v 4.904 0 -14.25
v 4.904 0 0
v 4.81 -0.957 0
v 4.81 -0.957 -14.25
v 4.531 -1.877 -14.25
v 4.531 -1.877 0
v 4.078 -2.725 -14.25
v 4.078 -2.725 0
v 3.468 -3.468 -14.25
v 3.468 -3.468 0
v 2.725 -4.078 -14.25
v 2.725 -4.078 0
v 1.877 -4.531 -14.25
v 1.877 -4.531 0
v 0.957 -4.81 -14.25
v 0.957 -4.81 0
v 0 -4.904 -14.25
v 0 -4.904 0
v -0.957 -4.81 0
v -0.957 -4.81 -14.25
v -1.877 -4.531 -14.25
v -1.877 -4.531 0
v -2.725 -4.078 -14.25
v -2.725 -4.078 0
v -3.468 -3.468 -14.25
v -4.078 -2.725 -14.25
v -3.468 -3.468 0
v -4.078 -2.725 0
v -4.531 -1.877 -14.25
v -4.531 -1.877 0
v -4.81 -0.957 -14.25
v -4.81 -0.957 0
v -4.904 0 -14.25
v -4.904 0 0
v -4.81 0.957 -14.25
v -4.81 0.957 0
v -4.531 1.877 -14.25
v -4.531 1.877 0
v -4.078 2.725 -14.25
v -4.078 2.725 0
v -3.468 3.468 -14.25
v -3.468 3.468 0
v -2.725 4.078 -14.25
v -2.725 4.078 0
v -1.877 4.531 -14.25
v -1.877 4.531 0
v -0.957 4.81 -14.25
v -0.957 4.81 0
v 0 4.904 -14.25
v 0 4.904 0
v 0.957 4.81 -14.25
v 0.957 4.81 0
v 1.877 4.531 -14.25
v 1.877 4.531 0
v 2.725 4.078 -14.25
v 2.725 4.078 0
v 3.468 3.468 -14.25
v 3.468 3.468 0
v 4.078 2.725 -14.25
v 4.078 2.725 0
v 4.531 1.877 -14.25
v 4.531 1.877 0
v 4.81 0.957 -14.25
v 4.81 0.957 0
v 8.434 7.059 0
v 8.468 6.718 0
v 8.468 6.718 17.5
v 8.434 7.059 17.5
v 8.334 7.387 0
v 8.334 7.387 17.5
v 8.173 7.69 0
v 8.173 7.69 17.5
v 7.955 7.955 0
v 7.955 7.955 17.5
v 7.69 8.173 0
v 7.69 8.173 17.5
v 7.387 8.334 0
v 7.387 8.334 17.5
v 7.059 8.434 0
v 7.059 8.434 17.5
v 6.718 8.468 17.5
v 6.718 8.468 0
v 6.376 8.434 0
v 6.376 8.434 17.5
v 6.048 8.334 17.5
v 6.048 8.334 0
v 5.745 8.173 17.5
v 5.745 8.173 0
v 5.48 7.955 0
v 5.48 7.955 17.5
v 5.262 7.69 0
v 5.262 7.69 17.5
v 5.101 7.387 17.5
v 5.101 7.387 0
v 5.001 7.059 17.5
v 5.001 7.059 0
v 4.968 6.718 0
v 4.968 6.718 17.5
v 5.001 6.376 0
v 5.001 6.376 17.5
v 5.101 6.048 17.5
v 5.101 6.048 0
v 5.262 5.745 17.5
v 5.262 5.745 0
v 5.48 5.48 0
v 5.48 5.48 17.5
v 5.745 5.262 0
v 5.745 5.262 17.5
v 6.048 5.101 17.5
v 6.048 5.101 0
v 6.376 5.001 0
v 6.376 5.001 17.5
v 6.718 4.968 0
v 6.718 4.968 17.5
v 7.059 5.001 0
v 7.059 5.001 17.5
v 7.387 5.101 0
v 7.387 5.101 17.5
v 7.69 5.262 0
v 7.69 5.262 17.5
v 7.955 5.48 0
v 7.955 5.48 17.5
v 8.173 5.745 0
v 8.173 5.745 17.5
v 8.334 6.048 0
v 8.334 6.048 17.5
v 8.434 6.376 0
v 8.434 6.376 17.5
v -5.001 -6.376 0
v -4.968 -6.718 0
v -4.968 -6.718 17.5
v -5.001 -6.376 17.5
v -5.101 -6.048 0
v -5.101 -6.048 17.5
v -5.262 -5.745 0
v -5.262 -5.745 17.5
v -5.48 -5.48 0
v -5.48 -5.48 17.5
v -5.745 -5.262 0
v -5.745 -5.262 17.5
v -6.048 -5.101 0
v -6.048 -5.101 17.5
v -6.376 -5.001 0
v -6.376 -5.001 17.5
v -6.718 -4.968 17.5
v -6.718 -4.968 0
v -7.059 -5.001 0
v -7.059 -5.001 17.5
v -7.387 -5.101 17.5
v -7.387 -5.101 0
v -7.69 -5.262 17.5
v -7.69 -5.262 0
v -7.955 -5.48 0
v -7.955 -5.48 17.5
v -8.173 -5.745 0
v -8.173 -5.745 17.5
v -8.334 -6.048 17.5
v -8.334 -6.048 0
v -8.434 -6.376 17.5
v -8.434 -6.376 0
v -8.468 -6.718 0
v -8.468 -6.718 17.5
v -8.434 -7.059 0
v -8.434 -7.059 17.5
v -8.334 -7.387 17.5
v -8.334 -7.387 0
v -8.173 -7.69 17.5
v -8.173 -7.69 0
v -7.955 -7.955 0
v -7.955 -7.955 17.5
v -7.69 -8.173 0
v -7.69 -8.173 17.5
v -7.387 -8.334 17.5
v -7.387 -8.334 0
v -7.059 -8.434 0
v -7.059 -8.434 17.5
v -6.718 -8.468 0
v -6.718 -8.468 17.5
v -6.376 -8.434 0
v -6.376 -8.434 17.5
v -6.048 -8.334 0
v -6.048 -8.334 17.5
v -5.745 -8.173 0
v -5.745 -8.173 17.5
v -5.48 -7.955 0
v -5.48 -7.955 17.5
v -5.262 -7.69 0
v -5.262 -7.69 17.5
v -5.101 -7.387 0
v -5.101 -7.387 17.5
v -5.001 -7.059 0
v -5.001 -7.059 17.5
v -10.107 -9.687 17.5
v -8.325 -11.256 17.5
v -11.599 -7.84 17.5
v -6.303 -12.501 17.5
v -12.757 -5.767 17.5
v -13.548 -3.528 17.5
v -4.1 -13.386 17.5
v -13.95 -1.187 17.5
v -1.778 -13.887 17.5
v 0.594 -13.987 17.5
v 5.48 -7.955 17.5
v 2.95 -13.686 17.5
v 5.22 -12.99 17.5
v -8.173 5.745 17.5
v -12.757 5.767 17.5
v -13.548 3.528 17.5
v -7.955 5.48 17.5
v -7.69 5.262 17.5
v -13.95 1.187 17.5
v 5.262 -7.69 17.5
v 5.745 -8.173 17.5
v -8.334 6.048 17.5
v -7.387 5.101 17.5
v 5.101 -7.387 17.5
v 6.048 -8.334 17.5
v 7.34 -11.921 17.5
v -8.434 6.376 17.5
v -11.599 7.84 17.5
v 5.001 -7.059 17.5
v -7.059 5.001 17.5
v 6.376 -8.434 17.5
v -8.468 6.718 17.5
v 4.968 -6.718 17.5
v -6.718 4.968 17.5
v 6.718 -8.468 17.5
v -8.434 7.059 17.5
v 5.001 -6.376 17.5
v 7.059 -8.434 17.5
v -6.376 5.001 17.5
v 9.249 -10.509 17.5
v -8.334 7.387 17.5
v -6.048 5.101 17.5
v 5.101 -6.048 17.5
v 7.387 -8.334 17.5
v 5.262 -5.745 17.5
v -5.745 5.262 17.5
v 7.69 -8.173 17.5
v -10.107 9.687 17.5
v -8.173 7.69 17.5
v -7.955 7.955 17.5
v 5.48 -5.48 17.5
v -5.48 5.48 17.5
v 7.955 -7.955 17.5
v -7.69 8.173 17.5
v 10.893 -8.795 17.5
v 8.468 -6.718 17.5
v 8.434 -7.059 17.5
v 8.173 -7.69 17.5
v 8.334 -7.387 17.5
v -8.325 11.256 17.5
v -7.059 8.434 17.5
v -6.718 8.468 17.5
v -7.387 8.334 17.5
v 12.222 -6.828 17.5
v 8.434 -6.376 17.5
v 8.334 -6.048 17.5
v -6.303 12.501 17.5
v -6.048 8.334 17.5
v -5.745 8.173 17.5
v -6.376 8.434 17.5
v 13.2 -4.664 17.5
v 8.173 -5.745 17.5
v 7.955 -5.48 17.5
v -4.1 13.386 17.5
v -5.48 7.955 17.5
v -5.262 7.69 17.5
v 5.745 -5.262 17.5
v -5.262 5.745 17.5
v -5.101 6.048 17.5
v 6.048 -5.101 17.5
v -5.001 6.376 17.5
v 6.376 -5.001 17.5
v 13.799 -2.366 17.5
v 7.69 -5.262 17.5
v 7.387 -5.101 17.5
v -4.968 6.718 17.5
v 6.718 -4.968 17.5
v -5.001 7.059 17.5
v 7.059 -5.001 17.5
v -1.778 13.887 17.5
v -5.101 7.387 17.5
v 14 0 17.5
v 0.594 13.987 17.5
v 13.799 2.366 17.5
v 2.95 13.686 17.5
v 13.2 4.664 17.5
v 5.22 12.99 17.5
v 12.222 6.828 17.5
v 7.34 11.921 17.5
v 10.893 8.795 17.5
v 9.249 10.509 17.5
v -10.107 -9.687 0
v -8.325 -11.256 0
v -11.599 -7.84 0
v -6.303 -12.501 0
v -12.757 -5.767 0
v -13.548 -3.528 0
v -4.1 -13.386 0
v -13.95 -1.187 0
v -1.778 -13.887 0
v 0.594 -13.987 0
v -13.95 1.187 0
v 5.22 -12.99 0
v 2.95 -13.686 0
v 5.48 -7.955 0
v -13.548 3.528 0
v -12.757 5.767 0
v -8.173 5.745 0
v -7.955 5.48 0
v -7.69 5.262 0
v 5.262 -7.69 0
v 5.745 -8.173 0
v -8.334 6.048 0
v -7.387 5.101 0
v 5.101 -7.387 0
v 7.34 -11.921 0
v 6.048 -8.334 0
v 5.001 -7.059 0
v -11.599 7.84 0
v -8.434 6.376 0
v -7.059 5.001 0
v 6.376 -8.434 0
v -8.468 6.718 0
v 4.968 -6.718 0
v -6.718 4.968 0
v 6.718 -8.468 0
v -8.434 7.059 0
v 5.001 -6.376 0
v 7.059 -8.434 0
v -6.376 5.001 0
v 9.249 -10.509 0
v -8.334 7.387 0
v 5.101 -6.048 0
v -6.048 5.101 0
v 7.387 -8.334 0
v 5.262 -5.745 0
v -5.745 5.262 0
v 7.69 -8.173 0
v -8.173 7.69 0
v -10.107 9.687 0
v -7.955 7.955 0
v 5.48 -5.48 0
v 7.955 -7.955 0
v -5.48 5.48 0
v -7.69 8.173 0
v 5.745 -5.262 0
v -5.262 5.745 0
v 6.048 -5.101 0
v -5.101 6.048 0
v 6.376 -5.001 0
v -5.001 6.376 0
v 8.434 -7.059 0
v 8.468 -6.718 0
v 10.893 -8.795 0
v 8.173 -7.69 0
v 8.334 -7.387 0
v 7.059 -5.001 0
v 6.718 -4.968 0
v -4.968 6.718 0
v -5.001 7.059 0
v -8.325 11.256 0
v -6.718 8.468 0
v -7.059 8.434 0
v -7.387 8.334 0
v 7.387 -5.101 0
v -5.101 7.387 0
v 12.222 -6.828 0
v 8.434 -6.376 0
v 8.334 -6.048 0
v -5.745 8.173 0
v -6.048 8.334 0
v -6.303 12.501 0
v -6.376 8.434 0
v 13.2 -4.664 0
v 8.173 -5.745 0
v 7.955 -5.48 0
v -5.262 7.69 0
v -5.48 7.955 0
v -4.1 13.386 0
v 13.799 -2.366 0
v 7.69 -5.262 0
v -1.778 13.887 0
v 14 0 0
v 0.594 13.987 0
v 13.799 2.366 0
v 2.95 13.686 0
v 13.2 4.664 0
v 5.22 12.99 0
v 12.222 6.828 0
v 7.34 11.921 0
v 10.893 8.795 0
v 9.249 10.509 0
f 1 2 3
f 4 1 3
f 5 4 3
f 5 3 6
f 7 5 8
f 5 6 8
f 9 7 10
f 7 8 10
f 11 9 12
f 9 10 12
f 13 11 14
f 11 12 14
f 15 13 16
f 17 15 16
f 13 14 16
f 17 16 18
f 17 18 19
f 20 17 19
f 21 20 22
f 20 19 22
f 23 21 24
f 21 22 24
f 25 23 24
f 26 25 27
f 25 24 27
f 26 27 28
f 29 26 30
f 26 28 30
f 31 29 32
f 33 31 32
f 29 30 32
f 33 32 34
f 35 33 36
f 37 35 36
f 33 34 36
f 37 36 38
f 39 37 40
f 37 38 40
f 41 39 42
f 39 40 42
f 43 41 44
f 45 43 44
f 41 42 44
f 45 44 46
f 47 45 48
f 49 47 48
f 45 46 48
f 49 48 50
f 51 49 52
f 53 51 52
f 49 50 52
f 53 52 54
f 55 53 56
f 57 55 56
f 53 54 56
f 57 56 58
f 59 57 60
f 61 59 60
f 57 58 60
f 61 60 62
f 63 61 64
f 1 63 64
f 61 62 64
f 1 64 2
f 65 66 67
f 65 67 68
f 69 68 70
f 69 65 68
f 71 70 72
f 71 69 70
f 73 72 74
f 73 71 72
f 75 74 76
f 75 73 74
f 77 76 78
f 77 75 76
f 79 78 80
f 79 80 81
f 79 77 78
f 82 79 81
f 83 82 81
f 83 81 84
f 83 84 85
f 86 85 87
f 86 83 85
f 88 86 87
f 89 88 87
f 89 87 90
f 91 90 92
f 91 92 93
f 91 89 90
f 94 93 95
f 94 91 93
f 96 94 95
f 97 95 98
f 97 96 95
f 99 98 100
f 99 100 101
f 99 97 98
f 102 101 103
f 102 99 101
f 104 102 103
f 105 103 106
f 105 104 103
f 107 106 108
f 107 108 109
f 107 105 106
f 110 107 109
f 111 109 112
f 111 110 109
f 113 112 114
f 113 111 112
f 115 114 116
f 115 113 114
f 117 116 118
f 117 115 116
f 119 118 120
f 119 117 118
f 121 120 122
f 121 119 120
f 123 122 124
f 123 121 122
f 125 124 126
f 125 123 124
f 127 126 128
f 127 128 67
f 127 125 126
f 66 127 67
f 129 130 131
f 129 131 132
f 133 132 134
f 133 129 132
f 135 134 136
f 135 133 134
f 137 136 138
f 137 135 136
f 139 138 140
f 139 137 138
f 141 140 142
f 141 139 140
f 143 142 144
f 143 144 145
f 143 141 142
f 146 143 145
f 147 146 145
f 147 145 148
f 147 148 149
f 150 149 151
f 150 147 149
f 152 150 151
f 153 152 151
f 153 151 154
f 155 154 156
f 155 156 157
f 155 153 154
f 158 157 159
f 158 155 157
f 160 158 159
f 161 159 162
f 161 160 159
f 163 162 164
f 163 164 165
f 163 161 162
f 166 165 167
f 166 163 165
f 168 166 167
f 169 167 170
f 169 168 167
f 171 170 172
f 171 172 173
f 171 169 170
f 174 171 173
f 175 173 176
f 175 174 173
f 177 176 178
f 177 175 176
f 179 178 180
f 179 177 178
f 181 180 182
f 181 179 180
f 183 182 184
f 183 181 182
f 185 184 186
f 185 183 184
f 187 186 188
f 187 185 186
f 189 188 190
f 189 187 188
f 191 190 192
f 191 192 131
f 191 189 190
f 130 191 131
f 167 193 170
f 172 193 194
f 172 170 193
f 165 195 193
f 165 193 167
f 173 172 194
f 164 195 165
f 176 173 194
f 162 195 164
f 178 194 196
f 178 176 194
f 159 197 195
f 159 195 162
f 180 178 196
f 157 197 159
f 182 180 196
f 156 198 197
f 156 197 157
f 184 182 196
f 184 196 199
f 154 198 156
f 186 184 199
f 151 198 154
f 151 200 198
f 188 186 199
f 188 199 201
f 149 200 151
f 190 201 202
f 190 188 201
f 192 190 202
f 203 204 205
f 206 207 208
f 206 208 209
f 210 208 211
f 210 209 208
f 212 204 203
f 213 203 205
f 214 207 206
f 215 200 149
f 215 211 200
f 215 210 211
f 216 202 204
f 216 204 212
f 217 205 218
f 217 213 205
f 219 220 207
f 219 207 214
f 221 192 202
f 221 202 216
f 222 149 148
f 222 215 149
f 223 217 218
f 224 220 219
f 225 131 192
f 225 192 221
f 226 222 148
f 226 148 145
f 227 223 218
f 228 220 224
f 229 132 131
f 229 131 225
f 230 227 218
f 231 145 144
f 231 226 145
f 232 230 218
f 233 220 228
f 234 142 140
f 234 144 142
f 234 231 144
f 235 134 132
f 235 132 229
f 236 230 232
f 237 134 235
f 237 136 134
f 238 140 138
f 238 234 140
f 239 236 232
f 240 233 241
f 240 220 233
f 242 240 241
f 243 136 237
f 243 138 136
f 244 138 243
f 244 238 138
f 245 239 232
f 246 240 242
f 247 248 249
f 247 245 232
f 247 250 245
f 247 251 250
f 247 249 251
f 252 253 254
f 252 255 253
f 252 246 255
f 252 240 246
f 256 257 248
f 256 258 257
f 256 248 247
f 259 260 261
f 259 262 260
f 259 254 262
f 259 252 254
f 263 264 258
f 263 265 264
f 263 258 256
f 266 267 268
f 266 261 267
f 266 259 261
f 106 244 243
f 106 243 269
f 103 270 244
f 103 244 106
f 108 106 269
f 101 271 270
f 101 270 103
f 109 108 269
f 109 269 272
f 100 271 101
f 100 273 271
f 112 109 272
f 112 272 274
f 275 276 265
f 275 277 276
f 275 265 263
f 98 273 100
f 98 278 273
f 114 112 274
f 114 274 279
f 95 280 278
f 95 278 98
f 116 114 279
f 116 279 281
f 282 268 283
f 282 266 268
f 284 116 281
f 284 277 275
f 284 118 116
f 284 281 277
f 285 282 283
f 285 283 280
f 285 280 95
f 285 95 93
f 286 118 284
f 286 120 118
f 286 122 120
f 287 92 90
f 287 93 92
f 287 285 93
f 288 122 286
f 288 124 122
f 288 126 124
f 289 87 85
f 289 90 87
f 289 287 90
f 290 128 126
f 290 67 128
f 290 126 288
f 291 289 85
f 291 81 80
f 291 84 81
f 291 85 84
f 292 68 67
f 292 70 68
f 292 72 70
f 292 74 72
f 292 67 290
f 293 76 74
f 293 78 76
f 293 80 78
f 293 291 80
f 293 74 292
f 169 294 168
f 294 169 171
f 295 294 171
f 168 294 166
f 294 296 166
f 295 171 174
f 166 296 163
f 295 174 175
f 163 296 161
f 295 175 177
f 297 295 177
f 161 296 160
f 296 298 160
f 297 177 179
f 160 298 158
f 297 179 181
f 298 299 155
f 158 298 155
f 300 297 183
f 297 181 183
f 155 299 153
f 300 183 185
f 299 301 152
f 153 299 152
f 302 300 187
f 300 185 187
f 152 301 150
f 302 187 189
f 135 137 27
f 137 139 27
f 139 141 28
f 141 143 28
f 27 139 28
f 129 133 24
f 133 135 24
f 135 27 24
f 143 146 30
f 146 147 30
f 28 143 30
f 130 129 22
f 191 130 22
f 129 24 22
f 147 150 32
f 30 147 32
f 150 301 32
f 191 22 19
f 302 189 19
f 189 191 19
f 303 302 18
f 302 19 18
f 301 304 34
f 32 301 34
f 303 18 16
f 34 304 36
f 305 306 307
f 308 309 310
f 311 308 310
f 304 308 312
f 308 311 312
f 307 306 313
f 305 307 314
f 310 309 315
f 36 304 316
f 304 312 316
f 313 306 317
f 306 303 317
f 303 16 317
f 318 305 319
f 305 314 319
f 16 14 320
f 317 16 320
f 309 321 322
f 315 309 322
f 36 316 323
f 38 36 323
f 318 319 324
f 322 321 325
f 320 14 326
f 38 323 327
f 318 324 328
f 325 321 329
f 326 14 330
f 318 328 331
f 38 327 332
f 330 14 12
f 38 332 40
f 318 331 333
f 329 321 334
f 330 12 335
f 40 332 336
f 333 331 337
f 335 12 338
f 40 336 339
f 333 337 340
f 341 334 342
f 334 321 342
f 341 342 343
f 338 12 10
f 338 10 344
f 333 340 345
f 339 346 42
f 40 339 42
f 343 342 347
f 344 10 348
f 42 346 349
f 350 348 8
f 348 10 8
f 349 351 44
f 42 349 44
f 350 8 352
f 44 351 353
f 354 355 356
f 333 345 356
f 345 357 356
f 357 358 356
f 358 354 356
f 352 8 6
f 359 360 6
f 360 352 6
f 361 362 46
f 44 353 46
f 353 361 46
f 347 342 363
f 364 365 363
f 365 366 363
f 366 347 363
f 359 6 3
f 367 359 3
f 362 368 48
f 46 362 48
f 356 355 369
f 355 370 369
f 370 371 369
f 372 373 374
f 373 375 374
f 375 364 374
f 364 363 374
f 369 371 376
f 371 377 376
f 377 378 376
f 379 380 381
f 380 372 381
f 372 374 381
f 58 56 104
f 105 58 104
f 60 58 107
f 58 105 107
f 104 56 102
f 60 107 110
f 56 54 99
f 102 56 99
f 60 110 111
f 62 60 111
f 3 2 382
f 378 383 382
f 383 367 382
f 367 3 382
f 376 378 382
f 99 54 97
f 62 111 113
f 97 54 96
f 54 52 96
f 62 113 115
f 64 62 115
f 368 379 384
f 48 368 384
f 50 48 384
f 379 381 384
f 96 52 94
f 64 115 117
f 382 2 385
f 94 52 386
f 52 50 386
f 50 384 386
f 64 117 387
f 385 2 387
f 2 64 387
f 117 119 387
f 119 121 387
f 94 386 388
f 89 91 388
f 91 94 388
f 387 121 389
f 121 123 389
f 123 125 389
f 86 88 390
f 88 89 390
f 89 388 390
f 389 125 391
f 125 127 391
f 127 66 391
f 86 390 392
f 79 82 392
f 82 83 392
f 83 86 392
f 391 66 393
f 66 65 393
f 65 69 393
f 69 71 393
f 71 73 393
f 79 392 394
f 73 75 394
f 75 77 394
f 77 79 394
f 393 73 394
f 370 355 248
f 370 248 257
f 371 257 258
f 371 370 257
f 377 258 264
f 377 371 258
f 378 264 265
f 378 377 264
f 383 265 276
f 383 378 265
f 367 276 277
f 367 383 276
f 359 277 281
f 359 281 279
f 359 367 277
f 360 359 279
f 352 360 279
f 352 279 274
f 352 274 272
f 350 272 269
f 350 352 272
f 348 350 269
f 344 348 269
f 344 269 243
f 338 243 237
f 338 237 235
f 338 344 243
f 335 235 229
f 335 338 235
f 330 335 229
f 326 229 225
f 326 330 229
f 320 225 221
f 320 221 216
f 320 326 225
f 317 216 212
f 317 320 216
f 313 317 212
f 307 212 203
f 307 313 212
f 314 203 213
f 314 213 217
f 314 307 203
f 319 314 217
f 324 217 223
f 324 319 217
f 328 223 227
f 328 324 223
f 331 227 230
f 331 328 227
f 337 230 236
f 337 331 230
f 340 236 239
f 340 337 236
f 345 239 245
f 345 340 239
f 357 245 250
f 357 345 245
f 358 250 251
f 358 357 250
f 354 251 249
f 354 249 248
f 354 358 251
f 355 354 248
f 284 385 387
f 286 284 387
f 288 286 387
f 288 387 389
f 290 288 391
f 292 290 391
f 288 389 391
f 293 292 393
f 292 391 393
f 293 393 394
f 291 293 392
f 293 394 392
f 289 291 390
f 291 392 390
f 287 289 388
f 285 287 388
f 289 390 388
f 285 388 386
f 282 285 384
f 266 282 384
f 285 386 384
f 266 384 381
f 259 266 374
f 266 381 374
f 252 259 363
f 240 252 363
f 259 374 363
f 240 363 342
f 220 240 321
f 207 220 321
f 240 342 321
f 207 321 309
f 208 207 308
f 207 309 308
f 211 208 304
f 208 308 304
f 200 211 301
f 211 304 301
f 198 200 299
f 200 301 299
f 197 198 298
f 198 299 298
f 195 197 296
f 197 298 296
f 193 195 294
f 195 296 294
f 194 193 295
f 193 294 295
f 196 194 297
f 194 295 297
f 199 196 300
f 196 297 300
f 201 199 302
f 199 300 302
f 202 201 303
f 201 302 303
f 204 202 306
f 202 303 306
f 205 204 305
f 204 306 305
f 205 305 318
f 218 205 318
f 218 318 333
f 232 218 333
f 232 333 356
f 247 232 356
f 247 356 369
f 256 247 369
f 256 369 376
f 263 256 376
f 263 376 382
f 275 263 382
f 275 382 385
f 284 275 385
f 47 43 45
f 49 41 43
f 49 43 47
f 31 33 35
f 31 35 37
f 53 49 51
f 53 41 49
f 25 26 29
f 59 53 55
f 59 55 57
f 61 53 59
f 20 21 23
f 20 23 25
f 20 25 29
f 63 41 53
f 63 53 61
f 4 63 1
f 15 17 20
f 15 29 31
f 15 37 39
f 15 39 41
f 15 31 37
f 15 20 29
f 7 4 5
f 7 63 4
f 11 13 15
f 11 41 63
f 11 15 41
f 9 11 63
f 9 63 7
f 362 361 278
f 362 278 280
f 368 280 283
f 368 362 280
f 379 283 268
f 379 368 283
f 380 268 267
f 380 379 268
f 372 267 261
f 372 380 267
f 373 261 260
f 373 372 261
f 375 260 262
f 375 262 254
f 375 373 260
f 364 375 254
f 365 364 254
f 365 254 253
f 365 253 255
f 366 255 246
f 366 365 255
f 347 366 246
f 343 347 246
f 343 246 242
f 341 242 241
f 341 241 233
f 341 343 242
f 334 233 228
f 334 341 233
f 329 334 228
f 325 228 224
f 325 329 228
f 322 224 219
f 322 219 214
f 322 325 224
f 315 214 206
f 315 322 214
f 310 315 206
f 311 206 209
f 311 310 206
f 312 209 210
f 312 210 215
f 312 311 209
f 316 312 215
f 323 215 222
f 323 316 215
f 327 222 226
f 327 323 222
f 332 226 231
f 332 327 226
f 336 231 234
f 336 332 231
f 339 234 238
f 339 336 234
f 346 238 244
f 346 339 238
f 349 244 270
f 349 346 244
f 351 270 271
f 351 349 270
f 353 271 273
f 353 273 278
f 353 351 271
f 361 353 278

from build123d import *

# Parameters (mm, degrees)
ESQUISSE1_R        = 14
ESQUISSE1_R_2      = 1.75
BOSS_EXTRU_1_DEPTH = 17.5
ESQUISSE2_R        = 4.904077813
BOSS_EXTRU_2_DEPTH = 14.25


with BuildPart() as part:
    # Esquisse1 → Boss.-Extru.1 (new body)
    with BuildSketch(Plane.XY):
        Circle(ESQUISSE1_R)
        with Locations((-6.717514421, 6.717514421)):
            Circle(ESQUISSE1_R_2, mode=Mode.SUBTRACT)
        with Locations((6.717514421, 6.717514421)):
            Circle(ESQUISSE1_R_2, mode=Mode.SUBTRACT)
        with Locations((6.717514421, -6.717514421)):
            Circle(ESQUISSE1_R_2, mode=Mode.SUBTRACT)
        with Locations((-6.717514421, -6.717514421)):
            Circle(ESQUISSE1_R_2, mode=Mode.SUBTRACT)
    extrude(amount=BOSS_EXTRU_1_DEPTH)

    # Esquisse2 → Boss.-Extru.2 (add)
    with BuildSketch(Plane(origin=(0, 0, 0), x_dir=(-1, 0, 0), z_dir=(0, 0, -1))):
        with Locations(Location((0, 0, 0), (0, 0, 180))):
            Circle(ESQUISSE2_R)
    extrude(amount=BOSS_EXTRU_2_DEPTH)


solid = part.part
